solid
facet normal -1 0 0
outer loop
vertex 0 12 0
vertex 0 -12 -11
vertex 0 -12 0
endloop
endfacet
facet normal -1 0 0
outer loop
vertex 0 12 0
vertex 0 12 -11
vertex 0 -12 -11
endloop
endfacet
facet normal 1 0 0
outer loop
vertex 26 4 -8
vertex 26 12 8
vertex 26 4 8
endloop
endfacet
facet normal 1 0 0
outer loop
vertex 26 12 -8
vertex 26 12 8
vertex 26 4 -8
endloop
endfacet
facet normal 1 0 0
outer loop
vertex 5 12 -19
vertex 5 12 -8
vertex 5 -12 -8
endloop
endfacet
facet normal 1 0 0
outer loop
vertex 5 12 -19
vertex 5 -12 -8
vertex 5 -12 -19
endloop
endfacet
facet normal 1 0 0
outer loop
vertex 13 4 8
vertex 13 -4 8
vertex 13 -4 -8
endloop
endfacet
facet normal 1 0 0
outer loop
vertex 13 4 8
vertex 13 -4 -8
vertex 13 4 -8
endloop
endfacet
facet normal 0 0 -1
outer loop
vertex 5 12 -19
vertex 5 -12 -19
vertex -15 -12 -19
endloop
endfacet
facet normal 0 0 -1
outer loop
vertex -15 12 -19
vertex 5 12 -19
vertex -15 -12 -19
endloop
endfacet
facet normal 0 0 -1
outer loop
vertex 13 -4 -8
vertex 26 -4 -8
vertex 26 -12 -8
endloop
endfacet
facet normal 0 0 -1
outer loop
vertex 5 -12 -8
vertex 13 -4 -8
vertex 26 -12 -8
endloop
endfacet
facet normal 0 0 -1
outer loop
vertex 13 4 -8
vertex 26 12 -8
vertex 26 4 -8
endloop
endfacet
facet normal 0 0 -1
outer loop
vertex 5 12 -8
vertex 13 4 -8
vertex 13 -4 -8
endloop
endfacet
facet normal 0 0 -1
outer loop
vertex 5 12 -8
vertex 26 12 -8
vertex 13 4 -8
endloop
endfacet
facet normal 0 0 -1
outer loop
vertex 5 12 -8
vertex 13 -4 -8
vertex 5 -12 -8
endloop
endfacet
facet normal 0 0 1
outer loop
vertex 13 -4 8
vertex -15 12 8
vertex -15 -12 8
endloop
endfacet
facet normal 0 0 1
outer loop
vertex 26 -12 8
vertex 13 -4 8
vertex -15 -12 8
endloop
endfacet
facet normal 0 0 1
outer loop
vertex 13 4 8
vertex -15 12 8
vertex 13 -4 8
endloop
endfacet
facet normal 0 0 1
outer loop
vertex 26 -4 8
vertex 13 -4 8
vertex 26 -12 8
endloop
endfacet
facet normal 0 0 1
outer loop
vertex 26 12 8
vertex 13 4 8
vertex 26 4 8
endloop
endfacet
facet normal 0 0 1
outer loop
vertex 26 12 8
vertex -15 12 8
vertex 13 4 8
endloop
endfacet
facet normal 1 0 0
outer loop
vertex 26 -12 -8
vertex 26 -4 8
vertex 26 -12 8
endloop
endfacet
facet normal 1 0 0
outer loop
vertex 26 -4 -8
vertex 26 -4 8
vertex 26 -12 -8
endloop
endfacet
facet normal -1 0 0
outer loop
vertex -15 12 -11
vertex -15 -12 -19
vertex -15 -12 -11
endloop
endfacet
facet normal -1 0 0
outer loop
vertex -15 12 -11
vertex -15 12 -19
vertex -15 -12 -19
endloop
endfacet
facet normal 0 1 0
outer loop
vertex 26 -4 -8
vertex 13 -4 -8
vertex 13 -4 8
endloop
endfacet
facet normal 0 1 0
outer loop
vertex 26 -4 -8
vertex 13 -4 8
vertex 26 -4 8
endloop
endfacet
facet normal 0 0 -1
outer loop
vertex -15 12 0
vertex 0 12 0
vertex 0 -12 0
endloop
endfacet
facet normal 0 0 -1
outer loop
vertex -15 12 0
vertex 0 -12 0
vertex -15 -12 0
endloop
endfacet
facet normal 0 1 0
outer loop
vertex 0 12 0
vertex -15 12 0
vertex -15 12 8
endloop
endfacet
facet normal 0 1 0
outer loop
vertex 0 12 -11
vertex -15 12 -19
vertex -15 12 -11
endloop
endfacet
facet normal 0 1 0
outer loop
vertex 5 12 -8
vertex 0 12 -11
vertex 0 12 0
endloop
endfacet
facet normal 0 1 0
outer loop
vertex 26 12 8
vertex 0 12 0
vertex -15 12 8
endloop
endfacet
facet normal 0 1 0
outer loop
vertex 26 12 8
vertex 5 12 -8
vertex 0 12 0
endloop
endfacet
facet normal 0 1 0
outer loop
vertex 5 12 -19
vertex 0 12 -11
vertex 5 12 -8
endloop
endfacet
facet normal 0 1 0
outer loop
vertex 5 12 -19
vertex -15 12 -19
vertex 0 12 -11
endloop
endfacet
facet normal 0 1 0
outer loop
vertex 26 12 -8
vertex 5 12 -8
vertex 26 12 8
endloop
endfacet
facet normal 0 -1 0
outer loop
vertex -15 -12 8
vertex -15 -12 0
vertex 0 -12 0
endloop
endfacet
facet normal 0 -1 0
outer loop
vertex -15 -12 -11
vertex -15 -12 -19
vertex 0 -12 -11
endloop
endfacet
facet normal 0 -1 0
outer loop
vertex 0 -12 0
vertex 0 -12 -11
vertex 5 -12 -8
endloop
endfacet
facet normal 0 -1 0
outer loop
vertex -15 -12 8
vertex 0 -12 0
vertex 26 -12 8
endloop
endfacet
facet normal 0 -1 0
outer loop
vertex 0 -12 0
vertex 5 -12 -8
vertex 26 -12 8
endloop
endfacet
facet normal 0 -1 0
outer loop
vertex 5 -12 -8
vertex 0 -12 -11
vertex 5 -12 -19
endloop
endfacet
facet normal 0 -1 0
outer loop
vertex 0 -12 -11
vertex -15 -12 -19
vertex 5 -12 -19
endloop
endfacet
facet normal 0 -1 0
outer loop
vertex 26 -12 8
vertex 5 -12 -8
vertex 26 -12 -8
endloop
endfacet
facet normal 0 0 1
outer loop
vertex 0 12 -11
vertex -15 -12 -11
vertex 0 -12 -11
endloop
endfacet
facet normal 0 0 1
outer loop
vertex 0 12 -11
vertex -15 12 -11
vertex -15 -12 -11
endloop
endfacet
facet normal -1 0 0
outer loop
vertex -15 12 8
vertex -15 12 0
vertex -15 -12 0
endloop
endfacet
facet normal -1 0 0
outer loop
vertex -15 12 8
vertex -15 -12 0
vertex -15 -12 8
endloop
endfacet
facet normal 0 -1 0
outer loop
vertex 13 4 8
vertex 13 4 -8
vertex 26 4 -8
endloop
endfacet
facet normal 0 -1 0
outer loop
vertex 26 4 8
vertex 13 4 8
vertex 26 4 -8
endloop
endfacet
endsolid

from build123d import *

# Parameters (mm, degrees)
EXTRUDE_1_DEPTH     = 12
SKETCH_2_W          = 13
SKETCH_2_H          = 8
CUT_EXTRUDE_1_DEPTH = 24


with BuildPart() as part:
    # 草图1 → 凸台-拉伸1 (new, symmetric)
    with BuildSketch(Plane(origin=(0, 0, 0), x_dir=(1, 0, 0), z_dir=(0, 1, 0))):
        Polygon((0, 11), (0, 0), (-15, 0), (-15, -8), (26, -8), (26, 8), (5, 8), (5, 19), (-15, 19), (-15, 11), align=None)
    extrude(amount=EXTRUDE_1_DEPTH, both=True)

    # 草图2 → 切除-拉伸1 (cut)
    with BuildSketch(Plane.XY.offset(8)):
        with Locations((19.5, 0)):
            Rectangle(SKETCH_2_W, SKETCH_2_H)
    extrude(amount=-CUT_EXTRUDE_1_DEPTH, mode=Mode.SUBTRACT)


solid = part.part
